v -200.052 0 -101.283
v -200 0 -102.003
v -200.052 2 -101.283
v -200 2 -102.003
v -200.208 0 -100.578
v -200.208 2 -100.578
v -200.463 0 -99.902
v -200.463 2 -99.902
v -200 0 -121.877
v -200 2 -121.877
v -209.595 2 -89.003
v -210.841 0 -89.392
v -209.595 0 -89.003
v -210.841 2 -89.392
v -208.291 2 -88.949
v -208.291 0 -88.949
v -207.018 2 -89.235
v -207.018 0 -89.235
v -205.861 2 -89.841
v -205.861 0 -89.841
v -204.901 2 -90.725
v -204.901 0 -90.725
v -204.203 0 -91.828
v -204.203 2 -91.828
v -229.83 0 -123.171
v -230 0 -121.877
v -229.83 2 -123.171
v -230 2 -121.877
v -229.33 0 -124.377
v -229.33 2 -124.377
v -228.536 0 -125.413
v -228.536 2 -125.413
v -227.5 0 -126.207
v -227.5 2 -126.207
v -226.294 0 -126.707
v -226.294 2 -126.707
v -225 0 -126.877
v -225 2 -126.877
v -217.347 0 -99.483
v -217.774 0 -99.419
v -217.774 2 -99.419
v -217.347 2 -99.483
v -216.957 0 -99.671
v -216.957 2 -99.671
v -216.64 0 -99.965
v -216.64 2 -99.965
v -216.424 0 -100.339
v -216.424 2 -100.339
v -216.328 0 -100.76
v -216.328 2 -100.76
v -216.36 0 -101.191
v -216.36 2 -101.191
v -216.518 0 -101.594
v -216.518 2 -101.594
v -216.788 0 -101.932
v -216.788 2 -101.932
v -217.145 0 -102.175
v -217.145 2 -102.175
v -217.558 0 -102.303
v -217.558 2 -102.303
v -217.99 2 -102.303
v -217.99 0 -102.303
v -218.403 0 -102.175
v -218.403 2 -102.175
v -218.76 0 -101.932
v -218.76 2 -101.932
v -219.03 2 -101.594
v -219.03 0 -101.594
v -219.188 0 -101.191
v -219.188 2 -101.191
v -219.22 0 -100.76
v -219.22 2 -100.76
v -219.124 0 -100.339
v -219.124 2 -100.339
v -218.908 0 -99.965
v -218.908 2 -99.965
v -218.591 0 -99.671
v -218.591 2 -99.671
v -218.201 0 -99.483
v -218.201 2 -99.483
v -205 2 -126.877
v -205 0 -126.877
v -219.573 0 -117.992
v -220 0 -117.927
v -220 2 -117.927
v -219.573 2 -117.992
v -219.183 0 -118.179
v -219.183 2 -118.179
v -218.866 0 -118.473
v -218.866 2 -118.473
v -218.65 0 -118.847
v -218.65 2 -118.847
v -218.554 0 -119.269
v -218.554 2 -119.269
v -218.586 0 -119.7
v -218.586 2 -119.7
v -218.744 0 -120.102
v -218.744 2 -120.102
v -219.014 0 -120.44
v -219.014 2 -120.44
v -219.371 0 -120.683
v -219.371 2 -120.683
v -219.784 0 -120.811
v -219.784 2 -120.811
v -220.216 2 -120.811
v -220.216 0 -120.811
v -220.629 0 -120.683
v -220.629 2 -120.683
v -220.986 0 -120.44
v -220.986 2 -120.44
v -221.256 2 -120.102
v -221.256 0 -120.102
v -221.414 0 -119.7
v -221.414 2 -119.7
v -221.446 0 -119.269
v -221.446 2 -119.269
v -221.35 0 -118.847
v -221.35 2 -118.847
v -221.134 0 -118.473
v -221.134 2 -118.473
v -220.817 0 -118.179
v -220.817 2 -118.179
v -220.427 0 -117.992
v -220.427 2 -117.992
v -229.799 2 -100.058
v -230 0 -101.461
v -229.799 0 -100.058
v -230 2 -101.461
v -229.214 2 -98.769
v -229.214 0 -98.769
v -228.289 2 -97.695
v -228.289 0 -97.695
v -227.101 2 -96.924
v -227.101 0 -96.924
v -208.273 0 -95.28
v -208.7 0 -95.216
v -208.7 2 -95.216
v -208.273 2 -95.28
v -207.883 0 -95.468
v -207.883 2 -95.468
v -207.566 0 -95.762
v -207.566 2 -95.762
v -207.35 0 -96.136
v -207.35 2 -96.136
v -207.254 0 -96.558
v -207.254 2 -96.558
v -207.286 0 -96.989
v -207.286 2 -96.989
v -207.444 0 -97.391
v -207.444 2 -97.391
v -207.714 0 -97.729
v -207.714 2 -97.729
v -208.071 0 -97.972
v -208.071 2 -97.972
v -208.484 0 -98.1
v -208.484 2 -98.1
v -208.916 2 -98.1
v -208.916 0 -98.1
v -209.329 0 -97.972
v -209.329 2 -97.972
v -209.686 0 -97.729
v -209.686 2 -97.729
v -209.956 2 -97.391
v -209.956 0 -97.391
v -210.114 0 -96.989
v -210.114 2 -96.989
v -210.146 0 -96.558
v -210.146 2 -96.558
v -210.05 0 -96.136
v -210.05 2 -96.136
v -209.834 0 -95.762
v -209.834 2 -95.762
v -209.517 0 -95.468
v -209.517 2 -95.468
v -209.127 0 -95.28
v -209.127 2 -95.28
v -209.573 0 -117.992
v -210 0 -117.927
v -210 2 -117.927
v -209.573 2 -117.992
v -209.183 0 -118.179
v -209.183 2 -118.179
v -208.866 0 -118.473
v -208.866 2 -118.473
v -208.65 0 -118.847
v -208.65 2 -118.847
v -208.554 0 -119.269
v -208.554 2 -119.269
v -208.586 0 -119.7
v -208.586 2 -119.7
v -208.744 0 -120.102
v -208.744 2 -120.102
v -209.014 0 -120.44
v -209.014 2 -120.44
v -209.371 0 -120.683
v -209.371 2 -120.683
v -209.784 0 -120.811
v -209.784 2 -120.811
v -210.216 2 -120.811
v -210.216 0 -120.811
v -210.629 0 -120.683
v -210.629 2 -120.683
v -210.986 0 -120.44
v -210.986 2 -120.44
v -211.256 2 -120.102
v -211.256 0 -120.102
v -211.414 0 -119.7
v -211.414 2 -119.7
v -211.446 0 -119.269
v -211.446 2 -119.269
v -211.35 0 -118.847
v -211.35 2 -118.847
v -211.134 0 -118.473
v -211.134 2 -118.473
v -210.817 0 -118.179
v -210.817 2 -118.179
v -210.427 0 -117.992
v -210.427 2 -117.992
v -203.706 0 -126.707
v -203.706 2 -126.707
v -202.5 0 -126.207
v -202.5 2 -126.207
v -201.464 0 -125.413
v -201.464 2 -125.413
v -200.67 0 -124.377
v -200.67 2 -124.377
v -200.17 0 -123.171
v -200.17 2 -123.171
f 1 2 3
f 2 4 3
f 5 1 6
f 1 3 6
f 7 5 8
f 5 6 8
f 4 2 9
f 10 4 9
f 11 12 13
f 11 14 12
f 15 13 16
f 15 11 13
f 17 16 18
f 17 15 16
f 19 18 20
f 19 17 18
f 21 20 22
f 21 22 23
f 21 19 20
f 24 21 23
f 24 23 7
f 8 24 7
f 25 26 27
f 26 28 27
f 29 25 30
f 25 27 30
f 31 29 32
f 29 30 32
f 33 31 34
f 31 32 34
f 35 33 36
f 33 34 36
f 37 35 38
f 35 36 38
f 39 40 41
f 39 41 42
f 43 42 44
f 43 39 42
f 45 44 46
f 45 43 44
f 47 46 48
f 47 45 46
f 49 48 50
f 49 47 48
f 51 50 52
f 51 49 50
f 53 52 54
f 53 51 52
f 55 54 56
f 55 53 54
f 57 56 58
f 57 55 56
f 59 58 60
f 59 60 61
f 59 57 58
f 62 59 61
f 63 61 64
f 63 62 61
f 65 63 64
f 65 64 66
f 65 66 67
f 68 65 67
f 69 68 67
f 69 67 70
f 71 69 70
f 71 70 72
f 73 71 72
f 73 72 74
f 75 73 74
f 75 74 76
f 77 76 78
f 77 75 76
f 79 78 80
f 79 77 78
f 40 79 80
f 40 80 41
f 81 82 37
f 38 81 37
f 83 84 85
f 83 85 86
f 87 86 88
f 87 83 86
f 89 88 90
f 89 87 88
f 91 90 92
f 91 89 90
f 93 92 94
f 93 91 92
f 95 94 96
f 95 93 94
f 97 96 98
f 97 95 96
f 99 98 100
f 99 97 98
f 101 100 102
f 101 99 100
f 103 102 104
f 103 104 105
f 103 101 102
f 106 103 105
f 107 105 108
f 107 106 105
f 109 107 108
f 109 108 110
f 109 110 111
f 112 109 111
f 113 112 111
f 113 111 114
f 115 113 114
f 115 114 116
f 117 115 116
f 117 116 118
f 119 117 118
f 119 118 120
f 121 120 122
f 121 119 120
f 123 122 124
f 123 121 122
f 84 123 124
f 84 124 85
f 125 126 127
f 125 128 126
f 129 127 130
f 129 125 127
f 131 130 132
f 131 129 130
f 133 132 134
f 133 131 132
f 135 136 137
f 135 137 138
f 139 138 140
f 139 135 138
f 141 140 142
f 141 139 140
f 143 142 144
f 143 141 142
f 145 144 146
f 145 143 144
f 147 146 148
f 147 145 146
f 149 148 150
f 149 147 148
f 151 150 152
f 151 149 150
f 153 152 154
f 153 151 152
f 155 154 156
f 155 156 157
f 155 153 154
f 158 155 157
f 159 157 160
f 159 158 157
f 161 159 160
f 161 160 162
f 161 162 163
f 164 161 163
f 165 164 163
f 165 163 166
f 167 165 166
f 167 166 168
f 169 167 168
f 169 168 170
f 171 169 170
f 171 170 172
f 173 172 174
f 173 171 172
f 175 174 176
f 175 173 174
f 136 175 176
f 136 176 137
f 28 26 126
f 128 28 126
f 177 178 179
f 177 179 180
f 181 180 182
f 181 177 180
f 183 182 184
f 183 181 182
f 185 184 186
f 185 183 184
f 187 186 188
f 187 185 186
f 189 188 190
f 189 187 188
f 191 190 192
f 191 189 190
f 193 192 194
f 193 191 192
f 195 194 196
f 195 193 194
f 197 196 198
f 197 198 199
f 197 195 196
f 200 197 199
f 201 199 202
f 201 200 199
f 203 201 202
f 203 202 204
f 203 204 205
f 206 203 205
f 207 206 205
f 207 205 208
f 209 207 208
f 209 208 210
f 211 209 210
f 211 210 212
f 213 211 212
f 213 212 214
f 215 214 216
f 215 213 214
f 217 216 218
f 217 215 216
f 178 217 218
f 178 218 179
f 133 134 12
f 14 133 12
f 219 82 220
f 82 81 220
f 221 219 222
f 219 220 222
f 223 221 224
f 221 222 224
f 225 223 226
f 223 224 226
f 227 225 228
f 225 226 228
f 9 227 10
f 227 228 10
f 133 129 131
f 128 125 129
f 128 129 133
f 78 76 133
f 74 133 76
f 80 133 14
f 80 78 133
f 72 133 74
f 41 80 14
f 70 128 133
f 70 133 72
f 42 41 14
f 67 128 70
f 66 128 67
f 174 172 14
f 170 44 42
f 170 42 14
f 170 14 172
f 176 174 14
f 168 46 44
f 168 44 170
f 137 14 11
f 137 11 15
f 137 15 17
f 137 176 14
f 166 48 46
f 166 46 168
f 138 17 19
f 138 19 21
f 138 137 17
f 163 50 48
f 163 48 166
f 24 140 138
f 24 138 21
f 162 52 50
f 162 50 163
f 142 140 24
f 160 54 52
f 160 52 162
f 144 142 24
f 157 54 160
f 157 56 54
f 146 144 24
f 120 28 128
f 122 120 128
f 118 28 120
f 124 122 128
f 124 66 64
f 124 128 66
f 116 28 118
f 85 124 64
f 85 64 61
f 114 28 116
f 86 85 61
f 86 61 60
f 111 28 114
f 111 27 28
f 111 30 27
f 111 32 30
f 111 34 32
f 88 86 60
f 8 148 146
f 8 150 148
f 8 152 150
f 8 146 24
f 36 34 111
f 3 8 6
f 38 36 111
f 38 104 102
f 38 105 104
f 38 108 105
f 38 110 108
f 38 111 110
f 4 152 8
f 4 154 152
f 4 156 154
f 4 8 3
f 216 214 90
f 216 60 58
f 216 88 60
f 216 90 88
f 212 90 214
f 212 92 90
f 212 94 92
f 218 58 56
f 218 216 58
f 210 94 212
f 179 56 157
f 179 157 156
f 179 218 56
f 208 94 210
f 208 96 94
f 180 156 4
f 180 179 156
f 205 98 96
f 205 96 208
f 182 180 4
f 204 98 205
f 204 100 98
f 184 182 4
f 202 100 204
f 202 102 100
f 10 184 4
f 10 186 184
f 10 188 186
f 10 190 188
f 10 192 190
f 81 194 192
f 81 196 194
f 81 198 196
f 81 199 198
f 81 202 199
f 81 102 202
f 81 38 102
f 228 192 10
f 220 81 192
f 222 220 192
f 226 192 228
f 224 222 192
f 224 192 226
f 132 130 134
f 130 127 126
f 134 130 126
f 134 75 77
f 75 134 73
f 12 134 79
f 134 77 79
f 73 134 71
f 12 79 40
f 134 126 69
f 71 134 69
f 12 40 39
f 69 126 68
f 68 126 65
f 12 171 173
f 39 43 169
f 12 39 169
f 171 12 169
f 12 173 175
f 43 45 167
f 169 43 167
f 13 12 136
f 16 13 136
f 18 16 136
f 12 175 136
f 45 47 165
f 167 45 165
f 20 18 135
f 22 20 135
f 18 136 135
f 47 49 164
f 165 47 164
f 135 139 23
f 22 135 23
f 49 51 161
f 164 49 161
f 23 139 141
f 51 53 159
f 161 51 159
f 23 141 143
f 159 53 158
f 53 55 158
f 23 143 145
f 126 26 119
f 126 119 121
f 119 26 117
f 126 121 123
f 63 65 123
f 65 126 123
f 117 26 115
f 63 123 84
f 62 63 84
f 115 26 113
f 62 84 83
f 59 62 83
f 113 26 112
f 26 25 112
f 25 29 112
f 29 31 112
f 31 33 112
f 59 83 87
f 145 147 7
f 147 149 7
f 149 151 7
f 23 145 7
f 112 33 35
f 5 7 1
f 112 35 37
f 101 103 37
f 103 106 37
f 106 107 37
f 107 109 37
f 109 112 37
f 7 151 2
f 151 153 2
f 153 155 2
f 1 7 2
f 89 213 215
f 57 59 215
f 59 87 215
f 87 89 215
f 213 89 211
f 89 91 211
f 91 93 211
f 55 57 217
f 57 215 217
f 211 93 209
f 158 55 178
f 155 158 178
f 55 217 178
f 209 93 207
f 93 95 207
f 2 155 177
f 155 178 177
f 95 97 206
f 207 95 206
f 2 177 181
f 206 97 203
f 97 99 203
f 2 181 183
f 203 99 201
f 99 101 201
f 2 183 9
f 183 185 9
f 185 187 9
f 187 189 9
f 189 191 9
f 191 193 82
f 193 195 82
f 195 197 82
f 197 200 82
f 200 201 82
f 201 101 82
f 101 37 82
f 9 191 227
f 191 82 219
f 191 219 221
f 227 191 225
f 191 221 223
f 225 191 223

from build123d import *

# Parameters (mm, degrees)
SKETCH_1_R      = 1.45
EXTRUDE_1_DEPTH = 2
FILLET_1_R      = 5


with BuildPart() as part:
    # 草图1 → 凸台-拉伸1 (new body)
    with BuildSketch(Plane(origin=(0, 0, 0), x_dir=(1, 0, 0), z_dir=(0, 1, 0))):
        Polygon((-230, 126.877091055), (-230, 98.266220035), (-206.304299333, 87.290817382), (-200, 100.901688402), (-200, 126.877091055), align=None)
        with Locations(Location((-217.77393632, 100.868789323, 0), (0, 0, 270))):
            Circle(SKETCH_1_R, mode=Mode.SUBTRACT)
        with Locations(Location((-208.700022307, 96.665923102, 0), (0, 0, 270))):
            Circle(SKETCH_1_R, mode=Mode.SUBTRACT)
        with Locations(Location((-220, 119.377091055, 0), (0, 0, 270))):
            Circle(SKETCH_1_R, mode=Mode.SUBTRACT)
        with Locations(Location((-210, 119.377091055, 0), (0, 0, 270))):
            Circle(SKETCH_1_R, mode=Mode.SUBTRACT)
    extrude(amount=EXTRUDE_1_DEPTH)

    # 圆角1
    fillet_1_edges = [part.edges().sort_by_distance(p)[0] for p in [
        (-200, 1, -126.877091055),
        (-200, 1, -100.901688402),
        (-206.304299333, 1, -87.290817382),
        (-230, 1, -98.266220035),
        (-230, 1, -126.877091055),
    ]]
    fillet(fillet_1_edges, radius=FILLET_1_R)


solid = part.part
